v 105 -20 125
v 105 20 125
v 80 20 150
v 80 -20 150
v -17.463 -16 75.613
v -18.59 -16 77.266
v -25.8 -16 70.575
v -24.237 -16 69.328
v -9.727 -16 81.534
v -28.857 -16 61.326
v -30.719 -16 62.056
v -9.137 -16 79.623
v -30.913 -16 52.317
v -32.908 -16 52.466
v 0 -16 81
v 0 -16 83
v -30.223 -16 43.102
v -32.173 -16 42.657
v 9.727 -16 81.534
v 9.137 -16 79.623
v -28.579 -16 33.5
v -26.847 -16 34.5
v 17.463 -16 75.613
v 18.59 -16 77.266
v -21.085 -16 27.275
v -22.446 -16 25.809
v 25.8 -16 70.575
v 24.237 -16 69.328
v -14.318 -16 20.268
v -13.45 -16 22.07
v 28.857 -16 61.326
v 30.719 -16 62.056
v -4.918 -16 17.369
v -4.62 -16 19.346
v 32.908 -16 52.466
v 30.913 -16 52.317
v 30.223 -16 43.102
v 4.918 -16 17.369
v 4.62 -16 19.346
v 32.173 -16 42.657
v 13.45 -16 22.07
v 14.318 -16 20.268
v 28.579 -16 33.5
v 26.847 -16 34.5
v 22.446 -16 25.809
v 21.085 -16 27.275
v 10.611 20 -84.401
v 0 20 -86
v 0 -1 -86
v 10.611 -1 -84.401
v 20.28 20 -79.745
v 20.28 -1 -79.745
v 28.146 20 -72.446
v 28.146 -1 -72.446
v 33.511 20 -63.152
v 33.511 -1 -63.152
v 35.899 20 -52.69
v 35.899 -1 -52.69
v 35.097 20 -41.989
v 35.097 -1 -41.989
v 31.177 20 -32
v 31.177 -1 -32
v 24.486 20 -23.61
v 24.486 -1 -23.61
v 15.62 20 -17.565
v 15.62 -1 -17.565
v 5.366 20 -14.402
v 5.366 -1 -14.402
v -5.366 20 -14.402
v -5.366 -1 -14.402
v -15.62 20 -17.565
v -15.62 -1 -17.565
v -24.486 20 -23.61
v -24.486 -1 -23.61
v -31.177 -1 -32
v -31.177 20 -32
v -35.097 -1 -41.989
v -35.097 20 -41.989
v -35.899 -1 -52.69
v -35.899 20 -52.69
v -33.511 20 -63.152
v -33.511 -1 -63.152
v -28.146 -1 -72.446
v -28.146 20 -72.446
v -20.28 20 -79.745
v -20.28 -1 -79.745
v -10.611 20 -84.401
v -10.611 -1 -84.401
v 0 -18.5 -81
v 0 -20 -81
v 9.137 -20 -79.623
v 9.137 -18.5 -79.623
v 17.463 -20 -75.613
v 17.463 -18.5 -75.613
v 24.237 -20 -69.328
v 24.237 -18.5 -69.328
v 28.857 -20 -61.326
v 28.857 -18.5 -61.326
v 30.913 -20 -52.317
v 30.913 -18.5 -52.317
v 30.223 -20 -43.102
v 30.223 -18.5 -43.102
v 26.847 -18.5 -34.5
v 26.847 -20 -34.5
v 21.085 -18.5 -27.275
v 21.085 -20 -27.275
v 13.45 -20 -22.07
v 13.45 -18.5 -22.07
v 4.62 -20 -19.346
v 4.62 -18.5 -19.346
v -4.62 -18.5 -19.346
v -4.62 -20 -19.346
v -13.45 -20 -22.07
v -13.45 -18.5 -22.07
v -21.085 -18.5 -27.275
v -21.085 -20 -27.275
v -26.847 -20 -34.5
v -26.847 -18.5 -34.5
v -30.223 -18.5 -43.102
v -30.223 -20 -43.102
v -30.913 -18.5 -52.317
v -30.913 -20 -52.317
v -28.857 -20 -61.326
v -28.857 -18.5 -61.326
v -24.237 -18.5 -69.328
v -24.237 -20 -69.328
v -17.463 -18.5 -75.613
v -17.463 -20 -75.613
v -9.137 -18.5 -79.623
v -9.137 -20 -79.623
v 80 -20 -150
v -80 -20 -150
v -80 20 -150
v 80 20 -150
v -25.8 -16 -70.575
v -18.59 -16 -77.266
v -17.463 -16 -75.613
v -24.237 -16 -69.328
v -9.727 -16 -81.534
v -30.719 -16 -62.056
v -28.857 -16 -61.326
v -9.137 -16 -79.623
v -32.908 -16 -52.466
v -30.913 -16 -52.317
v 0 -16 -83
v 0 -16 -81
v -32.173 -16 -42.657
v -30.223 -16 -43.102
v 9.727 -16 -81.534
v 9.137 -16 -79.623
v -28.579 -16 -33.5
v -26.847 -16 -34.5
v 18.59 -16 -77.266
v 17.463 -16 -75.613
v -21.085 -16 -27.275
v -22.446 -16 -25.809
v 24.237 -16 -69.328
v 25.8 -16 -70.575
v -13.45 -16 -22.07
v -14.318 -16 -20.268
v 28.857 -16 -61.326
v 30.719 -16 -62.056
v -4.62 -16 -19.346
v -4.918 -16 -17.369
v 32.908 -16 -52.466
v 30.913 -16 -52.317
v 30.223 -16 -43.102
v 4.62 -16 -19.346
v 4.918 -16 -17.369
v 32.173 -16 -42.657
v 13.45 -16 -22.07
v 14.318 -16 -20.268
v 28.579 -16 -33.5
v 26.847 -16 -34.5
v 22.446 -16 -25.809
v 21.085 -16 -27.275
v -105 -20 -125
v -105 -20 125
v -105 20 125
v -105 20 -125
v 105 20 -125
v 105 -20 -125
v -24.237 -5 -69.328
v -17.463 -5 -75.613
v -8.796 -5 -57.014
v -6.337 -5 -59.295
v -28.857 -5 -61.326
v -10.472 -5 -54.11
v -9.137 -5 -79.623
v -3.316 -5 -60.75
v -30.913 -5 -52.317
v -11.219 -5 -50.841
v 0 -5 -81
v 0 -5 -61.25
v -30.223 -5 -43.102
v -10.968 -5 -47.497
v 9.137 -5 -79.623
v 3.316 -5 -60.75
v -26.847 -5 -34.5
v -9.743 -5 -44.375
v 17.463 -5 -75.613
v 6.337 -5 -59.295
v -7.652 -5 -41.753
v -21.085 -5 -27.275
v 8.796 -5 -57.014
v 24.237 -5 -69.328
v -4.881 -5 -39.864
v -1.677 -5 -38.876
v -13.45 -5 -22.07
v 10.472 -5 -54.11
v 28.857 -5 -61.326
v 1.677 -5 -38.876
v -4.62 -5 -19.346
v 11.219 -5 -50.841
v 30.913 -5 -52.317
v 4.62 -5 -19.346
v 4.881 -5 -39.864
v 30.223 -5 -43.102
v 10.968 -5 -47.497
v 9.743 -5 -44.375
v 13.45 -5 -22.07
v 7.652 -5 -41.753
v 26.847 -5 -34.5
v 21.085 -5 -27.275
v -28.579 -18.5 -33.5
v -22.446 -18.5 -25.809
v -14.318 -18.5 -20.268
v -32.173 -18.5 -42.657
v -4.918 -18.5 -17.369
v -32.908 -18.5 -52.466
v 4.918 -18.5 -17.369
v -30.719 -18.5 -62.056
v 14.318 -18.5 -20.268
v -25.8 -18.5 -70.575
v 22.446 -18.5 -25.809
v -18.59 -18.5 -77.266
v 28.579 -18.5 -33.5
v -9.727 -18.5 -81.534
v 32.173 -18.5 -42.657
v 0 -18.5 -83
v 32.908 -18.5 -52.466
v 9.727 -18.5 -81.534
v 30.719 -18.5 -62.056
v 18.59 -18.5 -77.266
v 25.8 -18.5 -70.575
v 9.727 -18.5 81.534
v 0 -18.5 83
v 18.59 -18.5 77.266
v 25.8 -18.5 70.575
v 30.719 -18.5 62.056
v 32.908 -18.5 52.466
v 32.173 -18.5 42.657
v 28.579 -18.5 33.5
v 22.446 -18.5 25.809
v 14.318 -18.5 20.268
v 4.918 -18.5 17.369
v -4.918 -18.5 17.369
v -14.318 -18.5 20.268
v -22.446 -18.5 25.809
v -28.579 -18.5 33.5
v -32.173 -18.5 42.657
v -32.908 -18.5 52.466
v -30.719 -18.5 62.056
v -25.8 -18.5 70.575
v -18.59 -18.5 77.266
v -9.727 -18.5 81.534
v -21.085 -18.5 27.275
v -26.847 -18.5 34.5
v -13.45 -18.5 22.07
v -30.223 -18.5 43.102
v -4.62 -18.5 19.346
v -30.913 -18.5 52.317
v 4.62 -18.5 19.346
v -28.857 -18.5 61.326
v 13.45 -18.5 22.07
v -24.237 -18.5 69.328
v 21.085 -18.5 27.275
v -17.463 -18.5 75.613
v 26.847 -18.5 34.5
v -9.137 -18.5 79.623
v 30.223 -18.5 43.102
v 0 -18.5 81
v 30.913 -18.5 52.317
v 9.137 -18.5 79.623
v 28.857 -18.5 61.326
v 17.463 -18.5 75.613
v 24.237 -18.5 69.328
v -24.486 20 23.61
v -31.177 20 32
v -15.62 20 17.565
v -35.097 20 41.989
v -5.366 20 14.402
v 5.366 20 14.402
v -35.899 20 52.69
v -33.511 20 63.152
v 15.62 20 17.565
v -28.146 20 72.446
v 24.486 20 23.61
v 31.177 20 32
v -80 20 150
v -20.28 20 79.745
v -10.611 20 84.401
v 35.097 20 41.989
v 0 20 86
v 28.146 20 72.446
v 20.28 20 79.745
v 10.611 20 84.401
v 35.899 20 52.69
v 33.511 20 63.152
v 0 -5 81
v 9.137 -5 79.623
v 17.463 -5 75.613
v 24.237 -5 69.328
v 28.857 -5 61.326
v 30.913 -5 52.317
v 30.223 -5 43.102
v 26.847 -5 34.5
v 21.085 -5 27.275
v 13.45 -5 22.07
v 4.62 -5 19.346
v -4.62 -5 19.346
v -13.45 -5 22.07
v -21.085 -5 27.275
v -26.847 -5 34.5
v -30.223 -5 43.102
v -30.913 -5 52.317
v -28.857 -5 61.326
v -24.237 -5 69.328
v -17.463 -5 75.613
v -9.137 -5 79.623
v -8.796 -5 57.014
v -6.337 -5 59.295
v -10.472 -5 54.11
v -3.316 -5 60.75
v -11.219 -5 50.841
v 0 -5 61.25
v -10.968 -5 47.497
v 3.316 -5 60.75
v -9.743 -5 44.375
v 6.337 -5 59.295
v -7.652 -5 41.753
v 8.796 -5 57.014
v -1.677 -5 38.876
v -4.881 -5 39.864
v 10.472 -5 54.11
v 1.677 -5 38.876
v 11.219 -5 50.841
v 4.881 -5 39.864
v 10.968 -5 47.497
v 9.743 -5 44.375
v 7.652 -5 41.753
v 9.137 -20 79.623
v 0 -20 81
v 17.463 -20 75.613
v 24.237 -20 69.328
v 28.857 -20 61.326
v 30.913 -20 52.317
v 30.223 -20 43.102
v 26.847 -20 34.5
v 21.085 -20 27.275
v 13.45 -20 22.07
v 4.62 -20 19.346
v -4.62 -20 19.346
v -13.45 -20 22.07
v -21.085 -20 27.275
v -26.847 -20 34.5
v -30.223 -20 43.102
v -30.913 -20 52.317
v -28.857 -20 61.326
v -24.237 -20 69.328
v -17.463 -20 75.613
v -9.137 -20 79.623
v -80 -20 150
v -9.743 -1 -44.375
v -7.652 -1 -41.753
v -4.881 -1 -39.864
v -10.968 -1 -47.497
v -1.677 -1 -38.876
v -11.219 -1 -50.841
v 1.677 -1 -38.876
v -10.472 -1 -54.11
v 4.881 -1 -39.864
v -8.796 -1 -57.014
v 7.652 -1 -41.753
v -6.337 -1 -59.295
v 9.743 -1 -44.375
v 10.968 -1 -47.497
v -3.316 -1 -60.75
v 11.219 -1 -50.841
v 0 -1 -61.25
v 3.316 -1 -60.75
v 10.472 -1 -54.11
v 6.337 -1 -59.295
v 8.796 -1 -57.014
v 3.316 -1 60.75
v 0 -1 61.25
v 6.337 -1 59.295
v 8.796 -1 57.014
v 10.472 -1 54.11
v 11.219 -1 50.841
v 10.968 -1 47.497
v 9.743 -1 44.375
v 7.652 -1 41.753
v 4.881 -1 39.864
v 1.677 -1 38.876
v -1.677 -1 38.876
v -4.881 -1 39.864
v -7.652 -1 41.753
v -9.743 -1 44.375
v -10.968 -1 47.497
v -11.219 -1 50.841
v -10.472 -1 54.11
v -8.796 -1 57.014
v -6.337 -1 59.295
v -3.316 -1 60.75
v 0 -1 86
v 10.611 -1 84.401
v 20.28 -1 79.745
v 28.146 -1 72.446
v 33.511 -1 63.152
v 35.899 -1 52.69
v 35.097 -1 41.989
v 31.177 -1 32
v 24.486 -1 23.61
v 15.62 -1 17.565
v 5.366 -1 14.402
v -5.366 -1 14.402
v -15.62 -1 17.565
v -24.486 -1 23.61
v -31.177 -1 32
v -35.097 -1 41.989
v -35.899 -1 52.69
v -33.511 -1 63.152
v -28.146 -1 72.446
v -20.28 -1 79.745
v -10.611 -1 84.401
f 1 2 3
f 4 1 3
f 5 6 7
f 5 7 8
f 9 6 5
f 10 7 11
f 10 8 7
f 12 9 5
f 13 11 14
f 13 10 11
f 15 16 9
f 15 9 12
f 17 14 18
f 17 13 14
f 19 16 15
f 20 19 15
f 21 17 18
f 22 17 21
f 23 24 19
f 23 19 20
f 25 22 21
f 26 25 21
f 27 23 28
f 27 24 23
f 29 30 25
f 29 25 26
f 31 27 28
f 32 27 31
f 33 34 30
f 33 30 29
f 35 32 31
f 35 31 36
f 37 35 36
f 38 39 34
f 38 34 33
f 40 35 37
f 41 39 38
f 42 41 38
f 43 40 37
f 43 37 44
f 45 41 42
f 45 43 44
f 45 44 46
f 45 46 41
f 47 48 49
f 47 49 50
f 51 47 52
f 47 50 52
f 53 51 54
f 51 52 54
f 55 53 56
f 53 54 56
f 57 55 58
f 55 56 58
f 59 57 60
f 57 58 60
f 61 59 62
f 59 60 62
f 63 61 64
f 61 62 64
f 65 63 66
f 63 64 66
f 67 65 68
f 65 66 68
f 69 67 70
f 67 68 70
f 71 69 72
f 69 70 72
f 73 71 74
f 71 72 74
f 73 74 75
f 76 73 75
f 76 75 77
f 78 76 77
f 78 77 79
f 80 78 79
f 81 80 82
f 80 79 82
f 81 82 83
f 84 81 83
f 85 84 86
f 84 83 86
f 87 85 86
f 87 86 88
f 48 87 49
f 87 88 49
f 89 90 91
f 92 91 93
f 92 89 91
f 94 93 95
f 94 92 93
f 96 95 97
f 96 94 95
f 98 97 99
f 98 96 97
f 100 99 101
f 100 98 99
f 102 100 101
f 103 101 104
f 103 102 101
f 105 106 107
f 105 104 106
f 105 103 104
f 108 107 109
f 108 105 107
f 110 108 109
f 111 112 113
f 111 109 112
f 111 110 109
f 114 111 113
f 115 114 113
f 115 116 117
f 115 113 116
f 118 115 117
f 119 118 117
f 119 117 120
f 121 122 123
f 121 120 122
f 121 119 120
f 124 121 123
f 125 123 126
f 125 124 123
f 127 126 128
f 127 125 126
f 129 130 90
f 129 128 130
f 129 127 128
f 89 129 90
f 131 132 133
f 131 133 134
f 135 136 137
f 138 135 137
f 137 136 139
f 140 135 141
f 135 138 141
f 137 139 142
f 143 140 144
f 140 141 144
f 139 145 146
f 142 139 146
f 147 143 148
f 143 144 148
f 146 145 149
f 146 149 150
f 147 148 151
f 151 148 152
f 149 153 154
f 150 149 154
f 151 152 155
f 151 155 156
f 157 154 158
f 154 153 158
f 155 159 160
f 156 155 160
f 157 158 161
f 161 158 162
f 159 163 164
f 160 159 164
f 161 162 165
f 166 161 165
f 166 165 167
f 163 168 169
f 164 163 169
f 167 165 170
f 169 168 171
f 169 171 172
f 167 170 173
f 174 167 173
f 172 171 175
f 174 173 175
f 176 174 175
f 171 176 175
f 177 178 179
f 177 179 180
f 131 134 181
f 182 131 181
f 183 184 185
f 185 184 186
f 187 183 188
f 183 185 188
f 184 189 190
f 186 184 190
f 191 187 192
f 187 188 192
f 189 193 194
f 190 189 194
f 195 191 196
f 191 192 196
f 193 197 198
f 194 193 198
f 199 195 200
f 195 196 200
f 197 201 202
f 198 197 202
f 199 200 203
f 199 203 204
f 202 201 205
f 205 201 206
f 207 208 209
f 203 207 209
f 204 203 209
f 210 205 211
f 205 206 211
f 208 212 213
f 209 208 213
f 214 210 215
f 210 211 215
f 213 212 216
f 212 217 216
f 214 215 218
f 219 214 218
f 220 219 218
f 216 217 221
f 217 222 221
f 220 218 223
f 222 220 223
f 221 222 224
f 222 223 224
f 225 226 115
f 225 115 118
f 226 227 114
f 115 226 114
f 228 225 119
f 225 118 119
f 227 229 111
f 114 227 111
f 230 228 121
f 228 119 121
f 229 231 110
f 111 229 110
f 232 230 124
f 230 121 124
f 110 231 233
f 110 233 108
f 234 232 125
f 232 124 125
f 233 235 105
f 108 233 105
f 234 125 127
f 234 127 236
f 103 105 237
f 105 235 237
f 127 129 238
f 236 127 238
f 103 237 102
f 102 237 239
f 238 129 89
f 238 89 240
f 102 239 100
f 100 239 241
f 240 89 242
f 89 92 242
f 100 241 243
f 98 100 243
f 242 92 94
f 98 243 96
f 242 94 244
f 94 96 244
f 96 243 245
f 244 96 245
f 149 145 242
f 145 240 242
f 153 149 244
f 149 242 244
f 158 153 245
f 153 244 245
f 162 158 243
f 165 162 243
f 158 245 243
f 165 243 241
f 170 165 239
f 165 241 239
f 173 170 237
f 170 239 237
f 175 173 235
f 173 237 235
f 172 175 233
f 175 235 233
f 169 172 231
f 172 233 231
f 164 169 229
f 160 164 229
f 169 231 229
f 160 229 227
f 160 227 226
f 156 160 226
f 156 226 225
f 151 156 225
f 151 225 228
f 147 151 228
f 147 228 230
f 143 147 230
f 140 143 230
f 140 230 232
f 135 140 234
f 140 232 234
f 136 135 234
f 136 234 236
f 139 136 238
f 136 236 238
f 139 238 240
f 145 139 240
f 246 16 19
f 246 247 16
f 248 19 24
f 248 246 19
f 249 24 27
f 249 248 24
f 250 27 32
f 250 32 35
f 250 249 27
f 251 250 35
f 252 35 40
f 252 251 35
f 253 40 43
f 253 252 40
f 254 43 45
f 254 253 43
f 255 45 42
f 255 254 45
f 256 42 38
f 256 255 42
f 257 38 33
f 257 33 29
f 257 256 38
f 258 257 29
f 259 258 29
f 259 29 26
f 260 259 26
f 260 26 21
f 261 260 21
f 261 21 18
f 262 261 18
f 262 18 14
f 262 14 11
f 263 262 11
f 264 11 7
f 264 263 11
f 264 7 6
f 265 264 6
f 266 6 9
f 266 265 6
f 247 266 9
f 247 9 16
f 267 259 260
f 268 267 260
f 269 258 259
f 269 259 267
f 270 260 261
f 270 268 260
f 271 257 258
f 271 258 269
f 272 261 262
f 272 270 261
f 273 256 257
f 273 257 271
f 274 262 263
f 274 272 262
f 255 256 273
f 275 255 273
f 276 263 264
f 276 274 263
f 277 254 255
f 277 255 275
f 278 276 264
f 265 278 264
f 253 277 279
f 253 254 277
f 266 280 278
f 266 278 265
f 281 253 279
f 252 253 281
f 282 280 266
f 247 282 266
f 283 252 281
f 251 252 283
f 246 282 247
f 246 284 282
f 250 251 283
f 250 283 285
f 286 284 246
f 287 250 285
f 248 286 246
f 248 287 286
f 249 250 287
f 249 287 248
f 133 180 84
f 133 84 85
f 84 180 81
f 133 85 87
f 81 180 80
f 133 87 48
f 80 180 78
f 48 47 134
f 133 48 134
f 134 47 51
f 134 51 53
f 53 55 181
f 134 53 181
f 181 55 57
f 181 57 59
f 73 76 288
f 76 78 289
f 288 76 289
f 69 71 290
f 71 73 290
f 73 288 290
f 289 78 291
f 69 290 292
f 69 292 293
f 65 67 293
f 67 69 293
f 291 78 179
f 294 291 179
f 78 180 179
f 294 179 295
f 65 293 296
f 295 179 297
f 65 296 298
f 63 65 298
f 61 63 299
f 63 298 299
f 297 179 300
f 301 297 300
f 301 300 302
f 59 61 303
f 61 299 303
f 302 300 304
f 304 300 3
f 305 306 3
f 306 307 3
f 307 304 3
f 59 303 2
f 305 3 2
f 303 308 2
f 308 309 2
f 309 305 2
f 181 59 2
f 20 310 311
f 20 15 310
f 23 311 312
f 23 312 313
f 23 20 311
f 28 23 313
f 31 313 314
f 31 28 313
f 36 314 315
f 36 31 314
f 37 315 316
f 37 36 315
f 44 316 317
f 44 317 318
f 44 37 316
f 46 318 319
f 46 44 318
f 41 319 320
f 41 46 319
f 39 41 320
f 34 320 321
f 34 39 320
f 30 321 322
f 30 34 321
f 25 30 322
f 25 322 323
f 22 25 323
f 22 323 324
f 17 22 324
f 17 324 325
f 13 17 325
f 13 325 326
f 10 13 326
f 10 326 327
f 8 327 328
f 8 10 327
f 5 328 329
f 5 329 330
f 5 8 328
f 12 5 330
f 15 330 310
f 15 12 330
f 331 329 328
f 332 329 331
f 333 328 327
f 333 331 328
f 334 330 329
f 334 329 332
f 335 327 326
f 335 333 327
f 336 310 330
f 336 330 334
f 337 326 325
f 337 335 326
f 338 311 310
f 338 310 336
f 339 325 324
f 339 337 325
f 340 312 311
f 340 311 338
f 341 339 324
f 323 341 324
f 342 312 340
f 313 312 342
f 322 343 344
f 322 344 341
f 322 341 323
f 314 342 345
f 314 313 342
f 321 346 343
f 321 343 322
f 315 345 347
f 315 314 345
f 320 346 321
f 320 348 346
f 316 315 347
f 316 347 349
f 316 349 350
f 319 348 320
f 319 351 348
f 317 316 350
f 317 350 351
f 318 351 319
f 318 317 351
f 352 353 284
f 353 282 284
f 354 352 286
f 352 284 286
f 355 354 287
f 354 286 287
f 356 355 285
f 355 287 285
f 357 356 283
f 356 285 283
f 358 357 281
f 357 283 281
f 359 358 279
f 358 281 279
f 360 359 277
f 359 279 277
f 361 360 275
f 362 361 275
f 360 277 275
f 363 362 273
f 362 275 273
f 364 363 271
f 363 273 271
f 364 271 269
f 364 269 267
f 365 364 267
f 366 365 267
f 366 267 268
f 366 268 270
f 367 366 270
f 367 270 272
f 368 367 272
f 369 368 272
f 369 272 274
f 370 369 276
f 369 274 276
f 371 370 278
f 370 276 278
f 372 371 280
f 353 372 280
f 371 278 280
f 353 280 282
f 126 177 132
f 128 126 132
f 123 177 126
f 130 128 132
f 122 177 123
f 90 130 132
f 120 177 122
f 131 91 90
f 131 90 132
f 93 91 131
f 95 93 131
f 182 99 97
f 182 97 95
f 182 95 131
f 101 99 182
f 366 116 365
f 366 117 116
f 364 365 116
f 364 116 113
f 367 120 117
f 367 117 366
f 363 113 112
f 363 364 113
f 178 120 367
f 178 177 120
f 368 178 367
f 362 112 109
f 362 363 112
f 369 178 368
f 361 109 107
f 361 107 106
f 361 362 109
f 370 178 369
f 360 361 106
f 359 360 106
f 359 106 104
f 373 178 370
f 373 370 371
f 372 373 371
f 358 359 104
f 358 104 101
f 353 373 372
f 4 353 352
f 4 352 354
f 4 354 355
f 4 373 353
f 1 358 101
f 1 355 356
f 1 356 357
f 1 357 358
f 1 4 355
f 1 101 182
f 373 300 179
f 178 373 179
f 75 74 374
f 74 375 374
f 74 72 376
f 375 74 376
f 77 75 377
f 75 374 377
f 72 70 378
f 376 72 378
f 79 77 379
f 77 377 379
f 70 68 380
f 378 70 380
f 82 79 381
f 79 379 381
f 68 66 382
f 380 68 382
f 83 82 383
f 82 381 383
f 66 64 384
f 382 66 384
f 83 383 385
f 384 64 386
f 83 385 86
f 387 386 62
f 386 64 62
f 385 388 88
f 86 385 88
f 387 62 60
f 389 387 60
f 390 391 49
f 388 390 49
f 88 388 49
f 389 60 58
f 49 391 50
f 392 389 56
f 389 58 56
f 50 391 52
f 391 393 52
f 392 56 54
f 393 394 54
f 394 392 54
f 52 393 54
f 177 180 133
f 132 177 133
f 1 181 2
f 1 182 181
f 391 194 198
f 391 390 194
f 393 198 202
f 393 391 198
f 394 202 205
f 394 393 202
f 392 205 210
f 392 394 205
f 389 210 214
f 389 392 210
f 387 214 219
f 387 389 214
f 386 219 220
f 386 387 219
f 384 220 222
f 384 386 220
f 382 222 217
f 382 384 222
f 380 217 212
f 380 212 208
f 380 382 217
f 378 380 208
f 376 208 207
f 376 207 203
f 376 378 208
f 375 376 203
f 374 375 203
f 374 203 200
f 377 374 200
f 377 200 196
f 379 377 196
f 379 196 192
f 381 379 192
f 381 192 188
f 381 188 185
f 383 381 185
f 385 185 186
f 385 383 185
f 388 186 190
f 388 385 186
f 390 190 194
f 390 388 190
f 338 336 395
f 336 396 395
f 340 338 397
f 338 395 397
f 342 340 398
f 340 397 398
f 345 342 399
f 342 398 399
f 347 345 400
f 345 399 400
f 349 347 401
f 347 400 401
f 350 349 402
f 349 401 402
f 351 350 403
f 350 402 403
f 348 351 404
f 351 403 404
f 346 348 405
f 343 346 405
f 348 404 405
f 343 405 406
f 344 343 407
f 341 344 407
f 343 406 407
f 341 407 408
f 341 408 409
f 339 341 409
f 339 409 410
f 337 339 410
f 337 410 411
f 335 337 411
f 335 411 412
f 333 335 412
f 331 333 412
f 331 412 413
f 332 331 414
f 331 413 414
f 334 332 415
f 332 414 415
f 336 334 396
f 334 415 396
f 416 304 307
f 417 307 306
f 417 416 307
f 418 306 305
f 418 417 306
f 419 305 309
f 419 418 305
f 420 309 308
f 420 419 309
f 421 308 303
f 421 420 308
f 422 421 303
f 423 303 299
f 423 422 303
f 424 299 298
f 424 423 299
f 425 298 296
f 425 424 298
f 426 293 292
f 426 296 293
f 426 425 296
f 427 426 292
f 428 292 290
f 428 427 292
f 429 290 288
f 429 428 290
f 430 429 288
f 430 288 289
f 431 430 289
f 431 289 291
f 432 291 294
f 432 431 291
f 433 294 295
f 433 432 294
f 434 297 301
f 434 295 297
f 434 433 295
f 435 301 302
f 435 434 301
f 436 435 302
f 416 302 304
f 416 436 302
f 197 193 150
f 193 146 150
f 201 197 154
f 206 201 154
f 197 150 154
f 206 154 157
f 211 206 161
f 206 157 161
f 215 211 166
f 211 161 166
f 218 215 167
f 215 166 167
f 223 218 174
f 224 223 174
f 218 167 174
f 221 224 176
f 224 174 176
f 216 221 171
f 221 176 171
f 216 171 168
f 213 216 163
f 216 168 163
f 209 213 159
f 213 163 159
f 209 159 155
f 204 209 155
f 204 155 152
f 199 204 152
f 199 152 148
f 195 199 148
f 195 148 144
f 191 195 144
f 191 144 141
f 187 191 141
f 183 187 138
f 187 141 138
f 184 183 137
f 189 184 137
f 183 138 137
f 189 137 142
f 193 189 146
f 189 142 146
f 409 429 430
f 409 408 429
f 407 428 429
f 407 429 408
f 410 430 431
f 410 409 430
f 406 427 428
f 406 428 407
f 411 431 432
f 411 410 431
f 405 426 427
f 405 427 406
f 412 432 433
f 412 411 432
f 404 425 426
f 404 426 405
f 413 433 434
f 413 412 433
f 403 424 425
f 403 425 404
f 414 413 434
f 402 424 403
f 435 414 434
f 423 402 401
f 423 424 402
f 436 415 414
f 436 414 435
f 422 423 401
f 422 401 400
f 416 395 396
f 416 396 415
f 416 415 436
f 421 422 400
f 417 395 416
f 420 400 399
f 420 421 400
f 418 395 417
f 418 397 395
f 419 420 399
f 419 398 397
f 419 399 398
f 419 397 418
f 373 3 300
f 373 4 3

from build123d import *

# Parameters (mm, degrees)
F1_DEPTH = 20
F2_W     = 3.0358287096
F2_H     = 31
F2_W_2   = 4
F2_H_2   = 11.25


# Not quite as in the source:
# - a pattern or mirror of a feature is missing from the dataset's text; its kind, count and spacing are read off the source's solid


with BuildPart() as f1:
    # F0 (on Front) → F1 (new body, symmetric)
    with BuildSketch(Plane.XZ):
        Polygon((80, 150), (-80, 150), (-105, 125), (-105, -125), (-80, -150), (80, -150), (105, -125), (105, 125), align=None)
    extrude(amount=F1_DEPTH, both=True)

    # F2 (on Right) → F3 (revolve, cut)
    with BuildSketch(Plane.YZ):
        with Locations((-20.0179143548, 65.5)):
            Rectangle(F2_W, F2_H)
        Polygon((-18.5, 81), (-18.5, 50), (-16, 50), (-16, 81), (-16, 83), (-18.5, 83), align=None)
        Polygon((-16, 81), (-16, 50), (-5, 50), (-5, 61.25), (-5, 81), align=None)
        with Locations((-3, 55.625)):
            Rectangle(F2_W_2, F2_H_2)
        Polygon((-1, 61.25), (-1, 50), (34.8119065166, 50), (34.8119065166, 86), (-1, 86), align=None)
    f3 = revolve(axis=Axis((0, 5.6746993214, 50), (0, 1, 0)), mode=Mode.SUBTRACT)

    # F3_copies: F3 across plane
    add(f3.mirror(Plane(origin=(0, 0, 0), x_dir=(-1, 0, 0), z_dir=(0, 0, -1))), mode=Mode.SUBTRACT)


solid = f1.part
